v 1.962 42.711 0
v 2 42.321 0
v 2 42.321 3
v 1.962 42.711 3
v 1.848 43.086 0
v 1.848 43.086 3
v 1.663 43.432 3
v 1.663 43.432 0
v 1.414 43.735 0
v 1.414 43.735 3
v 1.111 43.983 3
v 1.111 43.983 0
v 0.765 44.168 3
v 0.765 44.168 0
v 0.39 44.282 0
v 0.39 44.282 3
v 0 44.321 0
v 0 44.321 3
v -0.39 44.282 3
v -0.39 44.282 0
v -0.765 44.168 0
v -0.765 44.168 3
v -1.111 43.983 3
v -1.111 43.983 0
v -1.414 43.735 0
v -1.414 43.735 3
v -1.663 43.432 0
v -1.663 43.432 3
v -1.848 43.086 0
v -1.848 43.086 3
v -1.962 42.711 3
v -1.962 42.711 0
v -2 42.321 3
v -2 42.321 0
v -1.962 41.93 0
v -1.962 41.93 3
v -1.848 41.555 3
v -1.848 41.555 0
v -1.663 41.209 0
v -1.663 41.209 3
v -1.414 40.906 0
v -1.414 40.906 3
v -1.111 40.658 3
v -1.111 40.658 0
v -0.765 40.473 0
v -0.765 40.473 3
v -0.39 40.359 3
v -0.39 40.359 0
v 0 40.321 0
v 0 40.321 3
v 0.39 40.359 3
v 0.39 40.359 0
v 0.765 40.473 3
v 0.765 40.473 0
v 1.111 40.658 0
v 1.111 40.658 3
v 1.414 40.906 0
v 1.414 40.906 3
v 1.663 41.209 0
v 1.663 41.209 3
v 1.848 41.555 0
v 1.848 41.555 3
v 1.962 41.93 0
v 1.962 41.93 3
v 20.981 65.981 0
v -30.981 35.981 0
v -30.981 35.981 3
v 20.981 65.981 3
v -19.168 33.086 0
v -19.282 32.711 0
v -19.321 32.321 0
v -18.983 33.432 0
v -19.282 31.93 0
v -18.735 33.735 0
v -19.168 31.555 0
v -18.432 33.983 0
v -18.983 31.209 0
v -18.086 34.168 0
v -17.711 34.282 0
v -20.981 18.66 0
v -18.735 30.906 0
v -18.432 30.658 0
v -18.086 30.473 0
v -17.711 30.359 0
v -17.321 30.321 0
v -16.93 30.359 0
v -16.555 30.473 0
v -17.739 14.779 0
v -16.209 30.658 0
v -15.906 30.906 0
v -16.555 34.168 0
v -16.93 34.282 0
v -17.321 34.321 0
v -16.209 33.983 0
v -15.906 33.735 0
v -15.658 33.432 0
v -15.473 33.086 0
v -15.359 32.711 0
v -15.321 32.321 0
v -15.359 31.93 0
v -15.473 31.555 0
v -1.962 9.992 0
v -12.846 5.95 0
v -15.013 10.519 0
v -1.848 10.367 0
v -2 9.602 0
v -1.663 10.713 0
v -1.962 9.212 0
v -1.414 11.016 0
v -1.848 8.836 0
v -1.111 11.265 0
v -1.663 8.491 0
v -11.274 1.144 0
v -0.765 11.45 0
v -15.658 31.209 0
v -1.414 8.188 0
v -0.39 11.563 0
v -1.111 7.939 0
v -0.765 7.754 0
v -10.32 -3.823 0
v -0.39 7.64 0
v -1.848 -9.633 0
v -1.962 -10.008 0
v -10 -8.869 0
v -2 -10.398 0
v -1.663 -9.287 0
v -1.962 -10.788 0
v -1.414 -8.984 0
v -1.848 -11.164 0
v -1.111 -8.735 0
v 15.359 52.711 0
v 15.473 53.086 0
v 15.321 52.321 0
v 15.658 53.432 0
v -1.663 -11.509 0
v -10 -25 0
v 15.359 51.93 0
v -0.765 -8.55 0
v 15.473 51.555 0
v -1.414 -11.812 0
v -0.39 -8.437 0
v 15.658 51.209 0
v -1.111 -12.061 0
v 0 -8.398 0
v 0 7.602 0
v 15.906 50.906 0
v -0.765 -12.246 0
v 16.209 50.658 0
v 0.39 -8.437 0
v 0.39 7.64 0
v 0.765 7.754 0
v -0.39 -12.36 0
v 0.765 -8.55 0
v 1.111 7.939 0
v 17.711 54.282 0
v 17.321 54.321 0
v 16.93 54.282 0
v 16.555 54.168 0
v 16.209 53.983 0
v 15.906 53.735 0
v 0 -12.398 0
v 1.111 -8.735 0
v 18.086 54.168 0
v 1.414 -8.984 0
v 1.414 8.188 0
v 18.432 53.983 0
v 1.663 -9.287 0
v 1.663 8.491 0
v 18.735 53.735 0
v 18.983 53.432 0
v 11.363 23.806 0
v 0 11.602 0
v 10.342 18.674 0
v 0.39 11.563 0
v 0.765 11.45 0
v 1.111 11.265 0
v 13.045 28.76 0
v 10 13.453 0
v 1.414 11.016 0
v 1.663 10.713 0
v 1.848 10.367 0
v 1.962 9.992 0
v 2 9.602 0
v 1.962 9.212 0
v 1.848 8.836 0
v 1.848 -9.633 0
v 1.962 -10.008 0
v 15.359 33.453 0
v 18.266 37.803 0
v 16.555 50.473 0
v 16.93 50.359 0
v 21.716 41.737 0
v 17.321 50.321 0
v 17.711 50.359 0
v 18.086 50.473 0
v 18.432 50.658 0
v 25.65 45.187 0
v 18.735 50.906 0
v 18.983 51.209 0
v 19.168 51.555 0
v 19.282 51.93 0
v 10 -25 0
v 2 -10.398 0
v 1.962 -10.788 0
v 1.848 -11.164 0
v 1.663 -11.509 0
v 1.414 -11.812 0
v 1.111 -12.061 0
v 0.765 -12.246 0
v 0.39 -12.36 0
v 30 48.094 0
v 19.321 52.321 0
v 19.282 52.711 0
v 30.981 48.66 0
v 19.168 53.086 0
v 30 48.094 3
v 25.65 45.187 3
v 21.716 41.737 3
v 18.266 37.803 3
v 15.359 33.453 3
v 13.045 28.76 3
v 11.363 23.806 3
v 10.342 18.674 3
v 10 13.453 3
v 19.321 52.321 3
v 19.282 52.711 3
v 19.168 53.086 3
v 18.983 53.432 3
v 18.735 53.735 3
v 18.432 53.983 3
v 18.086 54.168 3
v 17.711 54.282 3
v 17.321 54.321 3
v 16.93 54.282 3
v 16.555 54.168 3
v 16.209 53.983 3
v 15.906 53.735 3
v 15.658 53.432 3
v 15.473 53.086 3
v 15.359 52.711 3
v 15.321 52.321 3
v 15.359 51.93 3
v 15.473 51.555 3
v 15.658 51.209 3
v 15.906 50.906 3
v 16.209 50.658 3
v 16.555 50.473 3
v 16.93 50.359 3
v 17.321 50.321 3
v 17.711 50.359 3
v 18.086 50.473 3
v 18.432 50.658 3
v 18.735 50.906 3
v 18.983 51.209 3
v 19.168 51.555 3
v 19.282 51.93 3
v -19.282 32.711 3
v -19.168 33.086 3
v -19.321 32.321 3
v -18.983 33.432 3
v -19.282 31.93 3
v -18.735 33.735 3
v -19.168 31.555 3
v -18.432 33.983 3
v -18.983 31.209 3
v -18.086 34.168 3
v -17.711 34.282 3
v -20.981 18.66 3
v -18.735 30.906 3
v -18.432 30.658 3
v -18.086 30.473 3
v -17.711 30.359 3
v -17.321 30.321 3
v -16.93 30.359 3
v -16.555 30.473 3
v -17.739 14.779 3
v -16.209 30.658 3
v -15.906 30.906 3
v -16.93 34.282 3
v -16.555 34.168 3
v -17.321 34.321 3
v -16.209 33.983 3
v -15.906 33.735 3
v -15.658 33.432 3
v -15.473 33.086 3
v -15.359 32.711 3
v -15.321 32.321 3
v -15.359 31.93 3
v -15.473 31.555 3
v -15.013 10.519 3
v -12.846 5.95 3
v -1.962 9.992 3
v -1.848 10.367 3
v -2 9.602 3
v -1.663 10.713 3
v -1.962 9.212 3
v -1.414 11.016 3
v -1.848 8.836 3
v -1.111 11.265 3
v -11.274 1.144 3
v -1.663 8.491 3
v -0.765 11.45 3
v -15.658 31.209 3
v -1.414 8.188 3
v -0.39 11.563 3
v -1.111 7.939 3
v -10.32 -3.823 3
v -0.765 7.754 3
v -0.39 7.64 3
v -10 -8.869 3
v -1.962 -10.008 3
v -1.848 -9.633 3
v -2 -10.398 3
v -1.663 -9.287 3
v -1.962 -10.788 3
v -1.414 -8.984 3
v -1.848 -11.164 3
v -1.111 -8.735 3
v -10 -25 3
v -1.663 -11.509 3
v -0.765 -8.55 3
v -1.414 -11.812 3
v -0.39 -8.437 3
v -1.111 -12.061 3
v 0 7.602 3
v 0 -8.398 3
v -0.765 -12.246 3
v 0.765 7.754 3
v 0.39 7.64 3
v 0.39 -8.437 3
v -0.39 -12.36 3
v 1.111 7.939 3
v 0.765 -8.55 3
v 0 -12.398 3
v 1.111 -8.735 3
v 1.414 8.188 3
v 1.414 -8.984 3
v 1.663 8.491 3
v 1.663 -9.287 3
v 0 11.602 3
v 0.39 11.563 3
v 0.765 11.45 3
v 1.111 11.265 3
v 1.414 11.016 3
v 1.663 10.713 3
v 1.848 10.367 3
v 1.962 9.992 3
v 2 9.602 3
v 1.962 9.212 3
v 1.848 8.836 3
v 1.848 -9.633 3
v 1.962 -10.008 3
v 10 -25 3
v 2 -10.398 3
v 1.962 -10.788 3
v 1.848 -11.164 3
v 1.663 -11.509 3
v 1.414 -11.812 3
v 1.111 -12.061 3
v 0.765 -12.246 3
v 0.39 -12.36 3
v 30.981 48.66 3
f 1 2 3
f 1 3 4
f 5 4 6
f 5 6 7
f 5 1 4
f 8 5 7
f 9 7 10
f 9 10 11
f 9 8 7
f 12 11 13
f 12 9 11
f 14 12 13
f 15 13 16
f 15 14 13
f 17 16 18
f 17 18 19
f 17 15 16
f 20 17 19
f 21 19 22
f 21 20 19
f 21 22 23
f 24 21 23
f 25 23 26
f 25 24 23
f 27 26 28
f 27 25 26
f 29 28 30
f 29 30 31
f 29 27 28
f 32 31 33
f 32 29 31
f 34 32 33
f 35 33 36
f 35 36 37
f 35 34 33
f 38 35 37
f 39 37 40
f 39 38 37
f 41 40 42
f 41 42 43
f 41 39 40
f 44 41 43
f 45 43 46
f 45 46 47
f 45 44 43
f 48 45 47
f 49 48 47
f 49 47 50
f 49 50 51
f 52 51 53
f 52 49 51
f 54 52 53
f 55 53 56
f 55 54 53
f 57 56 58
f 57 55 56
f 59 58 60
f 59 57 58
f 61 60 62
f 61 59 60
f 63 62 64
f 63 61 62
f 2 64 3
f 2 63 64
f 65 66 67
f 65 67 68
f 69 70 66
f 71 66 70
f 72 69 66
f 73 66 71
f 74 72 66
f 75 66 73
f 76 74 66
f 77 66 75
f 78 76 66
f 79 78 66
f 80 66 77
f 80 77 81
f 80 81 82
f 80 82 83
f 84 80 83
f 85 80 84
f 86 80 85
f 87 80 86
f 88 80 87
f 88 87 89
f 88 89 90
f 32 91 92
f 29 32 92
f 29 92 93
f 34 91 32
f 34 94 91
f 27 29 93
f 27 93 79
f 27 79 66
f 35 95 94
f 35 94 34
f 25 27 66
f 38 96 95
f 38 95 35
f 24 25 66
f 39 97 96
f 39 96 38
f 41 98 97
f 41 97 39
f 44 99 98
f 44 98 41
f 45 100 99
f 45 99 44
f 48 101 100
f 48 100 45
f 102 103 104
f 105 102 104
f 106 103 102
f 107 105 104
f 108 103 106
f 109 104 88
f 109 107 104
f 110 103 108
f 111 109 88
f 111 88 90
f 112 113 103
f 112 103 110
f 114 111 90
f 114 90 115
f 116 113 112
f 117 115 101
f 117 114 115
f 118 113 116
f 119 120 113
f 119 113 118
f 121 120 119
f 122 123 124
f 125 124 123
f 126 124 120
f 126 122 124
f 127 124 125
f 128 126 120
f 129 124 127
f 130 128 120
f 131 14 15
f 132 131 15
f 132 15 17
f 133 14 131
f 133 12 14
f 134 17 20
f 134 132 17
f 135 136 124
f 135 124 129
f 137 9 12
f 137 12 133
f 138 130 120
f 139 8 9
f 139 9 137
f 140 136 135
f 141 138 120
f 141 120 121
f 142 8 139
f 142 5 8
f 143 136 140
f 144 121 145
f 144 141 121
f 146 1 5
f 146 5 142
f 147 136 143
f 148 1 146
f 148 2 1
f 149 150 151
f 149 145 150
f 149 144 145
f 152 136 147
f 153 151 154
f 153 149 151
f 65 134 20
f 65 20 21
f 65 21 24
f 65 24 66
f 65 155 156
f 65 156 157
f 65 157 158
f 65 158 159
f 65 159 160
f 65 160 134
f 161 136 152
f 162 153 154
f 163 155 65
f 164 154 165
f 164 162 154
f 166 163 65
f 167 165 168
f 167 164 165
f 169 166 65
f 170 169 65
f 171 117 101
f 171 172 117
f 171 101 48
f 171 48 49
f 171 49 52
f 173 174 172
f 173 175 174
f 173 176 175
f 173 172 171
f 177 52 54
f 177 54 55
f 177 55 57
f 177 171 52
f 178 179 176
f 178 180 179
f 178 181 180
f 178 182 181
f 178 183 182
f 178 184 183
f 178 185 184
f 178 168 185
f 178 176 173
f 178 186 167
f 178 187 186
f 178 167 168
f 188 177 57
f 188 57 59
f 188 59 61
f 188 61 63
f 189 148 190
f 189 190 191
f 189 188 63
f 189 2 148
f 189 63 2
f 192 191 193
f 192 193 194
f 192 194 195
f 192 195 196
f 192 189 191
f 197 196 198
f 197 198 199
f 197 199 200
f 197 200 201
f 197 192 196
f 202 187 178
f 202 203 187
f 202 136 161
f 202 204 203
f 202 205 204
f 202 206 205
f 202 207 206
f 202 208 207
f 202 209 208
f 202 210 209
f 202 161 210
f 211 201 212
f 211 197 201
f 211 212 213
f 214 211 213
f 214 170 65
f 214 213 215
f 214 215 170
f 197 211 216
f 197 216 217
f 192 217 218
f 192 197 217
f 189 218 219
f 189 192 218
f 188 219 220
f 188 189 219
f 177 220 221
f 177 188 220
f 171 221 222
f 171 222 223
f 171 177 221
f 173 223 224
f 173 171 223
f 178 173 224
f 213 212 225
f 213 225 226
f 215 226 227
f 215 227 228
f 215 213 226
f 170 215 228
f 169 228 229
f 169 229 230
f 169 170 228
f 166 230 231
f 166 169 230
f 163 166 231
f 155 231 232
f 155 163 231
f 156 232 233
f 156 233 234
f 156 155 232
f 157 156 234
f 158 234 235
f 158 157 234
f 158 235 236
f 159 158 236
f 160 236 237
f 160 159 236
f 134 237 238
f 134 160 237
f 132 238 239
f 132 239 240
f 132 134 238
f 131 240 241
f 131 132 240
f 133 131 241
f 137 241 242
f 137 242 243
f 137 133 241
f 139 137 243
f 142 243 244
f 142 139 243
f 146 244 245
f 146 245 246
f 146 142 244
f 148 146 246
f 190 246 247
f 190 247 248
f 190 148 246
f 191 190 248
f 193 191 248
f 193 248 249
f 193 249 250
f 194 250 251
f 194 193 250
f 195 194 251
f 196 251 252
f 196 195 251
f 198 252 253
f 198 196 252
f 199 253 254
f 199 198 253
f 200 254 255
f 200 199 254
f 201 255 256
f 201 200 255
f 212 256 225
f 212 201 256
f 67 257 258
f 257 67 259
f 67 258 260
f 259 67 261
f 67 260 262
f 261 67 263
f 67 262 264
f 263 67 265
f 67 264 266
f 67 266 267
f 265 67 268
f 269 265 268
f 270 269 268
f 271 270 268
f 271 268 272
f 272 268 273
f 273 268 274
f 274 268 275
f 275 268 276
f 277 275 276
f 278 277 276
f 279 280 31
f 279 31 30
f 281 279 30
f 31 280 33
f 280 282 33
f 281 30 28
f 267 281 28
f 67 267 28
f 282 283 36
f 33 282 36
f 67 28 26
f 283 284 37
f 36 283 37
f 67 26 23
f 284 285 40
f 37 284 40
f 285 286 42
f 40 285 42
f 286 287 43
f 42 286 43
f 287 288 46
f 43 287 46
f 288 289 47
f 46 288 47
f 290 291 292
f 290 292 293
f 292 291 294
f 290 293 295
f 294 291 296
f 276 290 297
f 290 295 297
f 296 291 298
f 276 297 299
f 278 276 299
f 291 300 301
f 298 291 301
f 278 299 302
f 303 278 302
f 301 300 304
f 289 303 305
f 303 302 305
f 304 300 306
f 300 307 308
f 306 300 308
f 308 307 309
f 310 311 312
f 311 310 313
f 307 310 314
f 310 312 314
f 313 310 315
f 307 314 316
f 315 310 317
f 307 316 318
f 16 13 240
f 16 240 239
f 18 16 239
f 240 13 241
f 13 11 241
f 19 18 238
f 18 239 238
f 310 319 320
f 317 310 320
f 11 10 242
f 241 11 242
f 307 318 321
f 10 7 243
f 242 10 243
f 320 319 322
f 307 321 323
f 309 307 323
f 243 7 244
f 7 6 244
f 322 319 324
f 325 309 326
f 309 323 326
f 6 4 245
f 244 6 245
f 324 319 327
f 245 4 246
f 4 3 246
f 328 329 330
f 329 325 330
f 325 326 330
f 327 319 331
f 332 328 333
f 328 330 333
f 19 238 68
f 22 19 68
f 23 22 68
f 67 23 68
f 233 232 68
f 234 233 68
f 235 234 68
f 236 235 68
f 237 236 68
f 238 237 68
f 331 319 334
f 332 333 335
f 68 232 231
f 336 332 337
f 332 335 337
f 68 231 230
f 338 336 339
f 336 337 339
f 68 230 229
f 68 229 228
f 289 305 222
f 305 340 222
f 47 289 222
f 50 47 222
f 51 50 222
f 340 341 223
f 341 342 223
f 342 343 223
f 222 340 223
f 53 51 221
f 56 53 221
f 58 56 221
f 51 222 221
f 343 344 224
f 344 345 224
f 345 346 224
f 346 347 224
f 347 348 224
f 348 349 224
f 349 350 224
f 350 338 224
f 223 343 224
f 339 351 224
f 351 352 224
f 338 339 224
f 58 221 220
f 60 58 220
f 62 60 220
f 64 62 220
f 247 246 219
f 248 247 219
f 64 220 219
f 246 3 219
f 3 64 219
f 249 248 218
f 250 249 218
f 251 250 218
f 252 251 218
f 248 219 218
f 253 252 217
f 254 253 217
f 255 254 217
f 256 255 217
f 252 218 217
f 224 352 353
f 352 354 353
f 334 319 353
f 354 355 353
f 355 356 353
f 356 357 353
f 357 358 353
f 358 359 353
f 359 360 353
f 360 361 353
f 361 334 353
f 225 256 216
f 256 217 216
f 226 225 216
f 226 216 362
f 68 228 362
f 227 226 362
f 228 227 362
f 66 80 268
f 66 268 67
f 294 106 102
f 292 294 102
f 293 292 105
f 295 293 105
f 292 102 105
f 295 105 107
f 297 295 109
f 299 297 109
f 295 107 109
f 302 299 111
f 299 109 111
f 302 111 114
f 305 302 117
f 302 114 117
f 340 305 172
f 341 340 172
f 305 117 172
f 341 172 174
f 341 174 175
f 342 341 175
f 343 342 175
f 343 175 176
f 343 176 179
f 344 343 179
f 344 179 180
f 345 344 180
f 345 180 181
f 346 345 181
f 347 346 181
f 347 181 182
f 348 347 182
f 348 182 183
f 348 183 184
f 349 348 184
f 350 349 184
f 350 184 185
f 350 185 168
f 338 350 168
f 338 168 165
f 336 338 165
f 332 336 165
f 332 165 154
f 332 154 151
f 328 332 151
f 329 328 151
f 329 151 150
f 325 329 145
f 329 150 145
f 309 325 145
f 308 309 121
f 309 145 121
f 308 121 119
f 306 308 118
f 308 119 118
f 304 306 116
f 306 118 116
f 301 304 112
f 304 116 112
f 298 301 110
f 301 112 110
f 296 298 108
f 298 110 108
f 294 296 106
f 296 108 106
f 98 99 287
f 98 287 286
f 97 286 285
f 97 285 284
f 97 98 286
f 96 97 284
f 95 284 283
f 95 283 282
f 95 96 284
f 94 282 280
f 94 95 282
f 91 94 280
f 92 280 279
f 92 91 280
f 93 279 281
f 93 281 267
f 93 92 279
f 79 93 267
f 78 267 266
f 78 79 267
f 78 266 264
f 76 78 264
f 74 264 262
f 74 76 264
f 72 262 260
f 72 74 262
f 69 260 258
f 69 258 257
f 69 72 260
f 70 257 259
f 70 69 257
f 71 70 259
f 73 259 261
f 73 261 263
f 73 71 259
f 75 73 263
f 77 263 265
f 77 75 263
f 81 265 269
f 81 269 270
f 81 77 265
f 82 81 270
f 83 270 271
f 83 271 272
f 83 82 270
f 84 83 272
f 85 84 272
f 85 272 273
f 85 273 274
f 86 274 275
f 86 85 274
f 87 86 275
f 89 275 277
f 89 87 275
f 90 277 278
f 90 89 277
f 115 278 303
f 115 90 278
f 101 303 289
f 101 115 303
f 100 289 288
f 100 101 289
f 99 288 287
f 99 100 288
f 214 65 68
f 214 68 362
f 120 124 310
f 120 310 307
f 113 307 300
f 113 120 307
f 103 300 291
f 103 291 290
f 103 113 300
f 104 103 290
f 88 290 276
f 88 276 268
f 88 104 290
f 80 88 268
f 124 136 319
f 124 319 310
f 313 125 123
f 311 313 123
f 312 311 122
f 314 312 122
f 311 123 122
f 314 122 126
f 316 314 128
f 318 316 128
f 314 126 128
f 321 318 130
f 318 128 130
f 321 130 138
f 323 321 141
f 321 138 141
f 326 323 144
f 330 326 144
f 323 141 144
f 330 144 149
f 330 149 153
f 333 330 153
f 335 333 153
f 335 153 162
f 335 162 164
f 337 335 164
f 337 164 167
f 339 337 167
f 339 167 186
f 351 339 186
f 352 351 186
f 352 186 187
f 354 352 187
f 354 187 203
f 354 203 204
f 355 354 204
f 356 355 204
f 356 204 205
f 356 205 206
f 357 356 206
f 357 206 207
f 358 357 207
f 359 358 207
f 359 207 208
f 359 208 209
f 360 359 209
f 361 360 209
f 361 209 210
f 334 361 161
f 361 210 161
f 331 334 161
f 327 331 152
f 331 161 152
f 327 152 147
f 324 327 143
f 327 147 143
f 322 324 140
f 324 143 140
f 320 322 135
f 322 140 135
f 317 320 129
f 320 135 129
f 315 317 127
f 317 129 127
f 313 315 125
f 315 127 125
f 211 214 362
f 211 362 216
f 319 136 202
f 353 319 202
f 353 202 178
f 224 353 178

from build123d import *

# Parameters (mm, degrees)
SKETCH_1_R          = 2
SKETCH_1_W          = 20
SKETCH_1_H          = 50
EXTRUDE_1_DEPTH     = 3
FILLET_1_R          = 40
SKETCH_2_R          = 2
CUT_EXTRUDE_1_DEPTH = 10


with BuildPart() as part:
    # 草图1 → 凸台-拉伸1 (new body)
    # profile 1 of 3: a face of its own
    with BuildSketch(Plane.XY):
        Polygon((10, 36.547005384), (-10, 25), (10, 25), align=None)
    # profile 2 of 3: a face of its own
    with BuildSketch(Plane.XY):
        Polygon((20.980762114, 65.980762114), (30.980762114, 48.660254038), (-20.980762114, 18.660254038), (-30.980762114, 35.980762114), align=None)
        with Locations((0, 42.320508076)):
            Circle(SKETCH_1_R, mode=Mode.SUBTRACT)
        with Locations((17.320508076, 52.320508076)):
            Circle(SKETCH_1_R, mode=Mode.SUBTRACT)
        with Locations((-17.320508076, 32.320508076)):
            Circle(SKETCH_1_R, mode=Mode.SUBTRACT)
    # profile 3 of 3: a face of its own
    with BuildSketch(Plane.XY):
        Rectangle(SKETCH_1_W, SKETCH_1_H)
    extrude(amount=EXTRUDE_1_DEPTH)

    # 圆角1
    # the kernel refuses this fillet: 40 mm, written as the material it adds along each edge
    with BuildSketch(Plane(origin=(10, 36.547005384, 0), x_dir=(0, -1, 0), z_dir=(0, 0, 1))) as fillet_1_piece_1:
        with BuildLine():
            CenterArc((FILLET_1_R * 0.57735026919, FILLET_1_R), FILLET_1_R, 210, 60)
            Line((-FILLET_1_R * 0.288675134595, FILLET_1_R * 0.5), (-FILLET_1_R * 0.305995642671, FILLET_1_R * 0.49))
            Line((-FILLET_1_R * 0.305995642671, FILLET_1_R * 0.49), (-FILLET_1_R * 0.0115470053838, -FILLET_1_R * 0.02))
            Line((-FILLET_1_R * 0.0115470053838, -FILLET_1_R * 0.02), (FILLET_1_R * 0.57735026919, -FILLET_1_R * 0.02))
            Line((FILLET_1_R * 0.57735026919, -FILLET_1_R * 0.02), (FILLET_1_R * 0.57735026919, 0))
        make_face()
    extrude(amount=3)
    with BuildSketch(Plane(origin=(-10, 25, 0), x_dir=(-0.8660254037844363, -0.5000000000000041, 0), z_dir=(0, 0, 1))) as fillet_1_piece_2:
        with BuildLine():
            CenterArc((51.575734141, 9.331791971), FILLET_1_R, 150, 43.49112832)
            Line((16.93471799, 29.331791971), (16.241897667, 29.731791971))
            Line((16.241897667, 29.731791971), (-0.692820323, 0.4))
            Line((-0.692820323, 0.4), (0, -0.8))
            ThreePointArc((0, -0.8), (6.339745962, -0.8), (11.90156708, -0.186635839))
            Line((11.90156708, -0.186635839), (12.679491924, 0))
        make_face()
    extrude(amount=3)

    # 草图2 → 切除-拉伸1 (cut)
    with BuildSketch(Plane(origin=(0, 0, 0), x_dir=(-1, 0, 0), z_dir=(0, 0, -1))):
        with Locations((0, 9.601800669)):
            Circle(SKETCH_2_R)
        with Locations((0, -10.398199331)):
            Circle(SKETCH_2_R)
    extrude(amount=-CUT_EXTRUDE_1_DEPTH, mode=Mode.SUBTRACT)


solid = part.part
